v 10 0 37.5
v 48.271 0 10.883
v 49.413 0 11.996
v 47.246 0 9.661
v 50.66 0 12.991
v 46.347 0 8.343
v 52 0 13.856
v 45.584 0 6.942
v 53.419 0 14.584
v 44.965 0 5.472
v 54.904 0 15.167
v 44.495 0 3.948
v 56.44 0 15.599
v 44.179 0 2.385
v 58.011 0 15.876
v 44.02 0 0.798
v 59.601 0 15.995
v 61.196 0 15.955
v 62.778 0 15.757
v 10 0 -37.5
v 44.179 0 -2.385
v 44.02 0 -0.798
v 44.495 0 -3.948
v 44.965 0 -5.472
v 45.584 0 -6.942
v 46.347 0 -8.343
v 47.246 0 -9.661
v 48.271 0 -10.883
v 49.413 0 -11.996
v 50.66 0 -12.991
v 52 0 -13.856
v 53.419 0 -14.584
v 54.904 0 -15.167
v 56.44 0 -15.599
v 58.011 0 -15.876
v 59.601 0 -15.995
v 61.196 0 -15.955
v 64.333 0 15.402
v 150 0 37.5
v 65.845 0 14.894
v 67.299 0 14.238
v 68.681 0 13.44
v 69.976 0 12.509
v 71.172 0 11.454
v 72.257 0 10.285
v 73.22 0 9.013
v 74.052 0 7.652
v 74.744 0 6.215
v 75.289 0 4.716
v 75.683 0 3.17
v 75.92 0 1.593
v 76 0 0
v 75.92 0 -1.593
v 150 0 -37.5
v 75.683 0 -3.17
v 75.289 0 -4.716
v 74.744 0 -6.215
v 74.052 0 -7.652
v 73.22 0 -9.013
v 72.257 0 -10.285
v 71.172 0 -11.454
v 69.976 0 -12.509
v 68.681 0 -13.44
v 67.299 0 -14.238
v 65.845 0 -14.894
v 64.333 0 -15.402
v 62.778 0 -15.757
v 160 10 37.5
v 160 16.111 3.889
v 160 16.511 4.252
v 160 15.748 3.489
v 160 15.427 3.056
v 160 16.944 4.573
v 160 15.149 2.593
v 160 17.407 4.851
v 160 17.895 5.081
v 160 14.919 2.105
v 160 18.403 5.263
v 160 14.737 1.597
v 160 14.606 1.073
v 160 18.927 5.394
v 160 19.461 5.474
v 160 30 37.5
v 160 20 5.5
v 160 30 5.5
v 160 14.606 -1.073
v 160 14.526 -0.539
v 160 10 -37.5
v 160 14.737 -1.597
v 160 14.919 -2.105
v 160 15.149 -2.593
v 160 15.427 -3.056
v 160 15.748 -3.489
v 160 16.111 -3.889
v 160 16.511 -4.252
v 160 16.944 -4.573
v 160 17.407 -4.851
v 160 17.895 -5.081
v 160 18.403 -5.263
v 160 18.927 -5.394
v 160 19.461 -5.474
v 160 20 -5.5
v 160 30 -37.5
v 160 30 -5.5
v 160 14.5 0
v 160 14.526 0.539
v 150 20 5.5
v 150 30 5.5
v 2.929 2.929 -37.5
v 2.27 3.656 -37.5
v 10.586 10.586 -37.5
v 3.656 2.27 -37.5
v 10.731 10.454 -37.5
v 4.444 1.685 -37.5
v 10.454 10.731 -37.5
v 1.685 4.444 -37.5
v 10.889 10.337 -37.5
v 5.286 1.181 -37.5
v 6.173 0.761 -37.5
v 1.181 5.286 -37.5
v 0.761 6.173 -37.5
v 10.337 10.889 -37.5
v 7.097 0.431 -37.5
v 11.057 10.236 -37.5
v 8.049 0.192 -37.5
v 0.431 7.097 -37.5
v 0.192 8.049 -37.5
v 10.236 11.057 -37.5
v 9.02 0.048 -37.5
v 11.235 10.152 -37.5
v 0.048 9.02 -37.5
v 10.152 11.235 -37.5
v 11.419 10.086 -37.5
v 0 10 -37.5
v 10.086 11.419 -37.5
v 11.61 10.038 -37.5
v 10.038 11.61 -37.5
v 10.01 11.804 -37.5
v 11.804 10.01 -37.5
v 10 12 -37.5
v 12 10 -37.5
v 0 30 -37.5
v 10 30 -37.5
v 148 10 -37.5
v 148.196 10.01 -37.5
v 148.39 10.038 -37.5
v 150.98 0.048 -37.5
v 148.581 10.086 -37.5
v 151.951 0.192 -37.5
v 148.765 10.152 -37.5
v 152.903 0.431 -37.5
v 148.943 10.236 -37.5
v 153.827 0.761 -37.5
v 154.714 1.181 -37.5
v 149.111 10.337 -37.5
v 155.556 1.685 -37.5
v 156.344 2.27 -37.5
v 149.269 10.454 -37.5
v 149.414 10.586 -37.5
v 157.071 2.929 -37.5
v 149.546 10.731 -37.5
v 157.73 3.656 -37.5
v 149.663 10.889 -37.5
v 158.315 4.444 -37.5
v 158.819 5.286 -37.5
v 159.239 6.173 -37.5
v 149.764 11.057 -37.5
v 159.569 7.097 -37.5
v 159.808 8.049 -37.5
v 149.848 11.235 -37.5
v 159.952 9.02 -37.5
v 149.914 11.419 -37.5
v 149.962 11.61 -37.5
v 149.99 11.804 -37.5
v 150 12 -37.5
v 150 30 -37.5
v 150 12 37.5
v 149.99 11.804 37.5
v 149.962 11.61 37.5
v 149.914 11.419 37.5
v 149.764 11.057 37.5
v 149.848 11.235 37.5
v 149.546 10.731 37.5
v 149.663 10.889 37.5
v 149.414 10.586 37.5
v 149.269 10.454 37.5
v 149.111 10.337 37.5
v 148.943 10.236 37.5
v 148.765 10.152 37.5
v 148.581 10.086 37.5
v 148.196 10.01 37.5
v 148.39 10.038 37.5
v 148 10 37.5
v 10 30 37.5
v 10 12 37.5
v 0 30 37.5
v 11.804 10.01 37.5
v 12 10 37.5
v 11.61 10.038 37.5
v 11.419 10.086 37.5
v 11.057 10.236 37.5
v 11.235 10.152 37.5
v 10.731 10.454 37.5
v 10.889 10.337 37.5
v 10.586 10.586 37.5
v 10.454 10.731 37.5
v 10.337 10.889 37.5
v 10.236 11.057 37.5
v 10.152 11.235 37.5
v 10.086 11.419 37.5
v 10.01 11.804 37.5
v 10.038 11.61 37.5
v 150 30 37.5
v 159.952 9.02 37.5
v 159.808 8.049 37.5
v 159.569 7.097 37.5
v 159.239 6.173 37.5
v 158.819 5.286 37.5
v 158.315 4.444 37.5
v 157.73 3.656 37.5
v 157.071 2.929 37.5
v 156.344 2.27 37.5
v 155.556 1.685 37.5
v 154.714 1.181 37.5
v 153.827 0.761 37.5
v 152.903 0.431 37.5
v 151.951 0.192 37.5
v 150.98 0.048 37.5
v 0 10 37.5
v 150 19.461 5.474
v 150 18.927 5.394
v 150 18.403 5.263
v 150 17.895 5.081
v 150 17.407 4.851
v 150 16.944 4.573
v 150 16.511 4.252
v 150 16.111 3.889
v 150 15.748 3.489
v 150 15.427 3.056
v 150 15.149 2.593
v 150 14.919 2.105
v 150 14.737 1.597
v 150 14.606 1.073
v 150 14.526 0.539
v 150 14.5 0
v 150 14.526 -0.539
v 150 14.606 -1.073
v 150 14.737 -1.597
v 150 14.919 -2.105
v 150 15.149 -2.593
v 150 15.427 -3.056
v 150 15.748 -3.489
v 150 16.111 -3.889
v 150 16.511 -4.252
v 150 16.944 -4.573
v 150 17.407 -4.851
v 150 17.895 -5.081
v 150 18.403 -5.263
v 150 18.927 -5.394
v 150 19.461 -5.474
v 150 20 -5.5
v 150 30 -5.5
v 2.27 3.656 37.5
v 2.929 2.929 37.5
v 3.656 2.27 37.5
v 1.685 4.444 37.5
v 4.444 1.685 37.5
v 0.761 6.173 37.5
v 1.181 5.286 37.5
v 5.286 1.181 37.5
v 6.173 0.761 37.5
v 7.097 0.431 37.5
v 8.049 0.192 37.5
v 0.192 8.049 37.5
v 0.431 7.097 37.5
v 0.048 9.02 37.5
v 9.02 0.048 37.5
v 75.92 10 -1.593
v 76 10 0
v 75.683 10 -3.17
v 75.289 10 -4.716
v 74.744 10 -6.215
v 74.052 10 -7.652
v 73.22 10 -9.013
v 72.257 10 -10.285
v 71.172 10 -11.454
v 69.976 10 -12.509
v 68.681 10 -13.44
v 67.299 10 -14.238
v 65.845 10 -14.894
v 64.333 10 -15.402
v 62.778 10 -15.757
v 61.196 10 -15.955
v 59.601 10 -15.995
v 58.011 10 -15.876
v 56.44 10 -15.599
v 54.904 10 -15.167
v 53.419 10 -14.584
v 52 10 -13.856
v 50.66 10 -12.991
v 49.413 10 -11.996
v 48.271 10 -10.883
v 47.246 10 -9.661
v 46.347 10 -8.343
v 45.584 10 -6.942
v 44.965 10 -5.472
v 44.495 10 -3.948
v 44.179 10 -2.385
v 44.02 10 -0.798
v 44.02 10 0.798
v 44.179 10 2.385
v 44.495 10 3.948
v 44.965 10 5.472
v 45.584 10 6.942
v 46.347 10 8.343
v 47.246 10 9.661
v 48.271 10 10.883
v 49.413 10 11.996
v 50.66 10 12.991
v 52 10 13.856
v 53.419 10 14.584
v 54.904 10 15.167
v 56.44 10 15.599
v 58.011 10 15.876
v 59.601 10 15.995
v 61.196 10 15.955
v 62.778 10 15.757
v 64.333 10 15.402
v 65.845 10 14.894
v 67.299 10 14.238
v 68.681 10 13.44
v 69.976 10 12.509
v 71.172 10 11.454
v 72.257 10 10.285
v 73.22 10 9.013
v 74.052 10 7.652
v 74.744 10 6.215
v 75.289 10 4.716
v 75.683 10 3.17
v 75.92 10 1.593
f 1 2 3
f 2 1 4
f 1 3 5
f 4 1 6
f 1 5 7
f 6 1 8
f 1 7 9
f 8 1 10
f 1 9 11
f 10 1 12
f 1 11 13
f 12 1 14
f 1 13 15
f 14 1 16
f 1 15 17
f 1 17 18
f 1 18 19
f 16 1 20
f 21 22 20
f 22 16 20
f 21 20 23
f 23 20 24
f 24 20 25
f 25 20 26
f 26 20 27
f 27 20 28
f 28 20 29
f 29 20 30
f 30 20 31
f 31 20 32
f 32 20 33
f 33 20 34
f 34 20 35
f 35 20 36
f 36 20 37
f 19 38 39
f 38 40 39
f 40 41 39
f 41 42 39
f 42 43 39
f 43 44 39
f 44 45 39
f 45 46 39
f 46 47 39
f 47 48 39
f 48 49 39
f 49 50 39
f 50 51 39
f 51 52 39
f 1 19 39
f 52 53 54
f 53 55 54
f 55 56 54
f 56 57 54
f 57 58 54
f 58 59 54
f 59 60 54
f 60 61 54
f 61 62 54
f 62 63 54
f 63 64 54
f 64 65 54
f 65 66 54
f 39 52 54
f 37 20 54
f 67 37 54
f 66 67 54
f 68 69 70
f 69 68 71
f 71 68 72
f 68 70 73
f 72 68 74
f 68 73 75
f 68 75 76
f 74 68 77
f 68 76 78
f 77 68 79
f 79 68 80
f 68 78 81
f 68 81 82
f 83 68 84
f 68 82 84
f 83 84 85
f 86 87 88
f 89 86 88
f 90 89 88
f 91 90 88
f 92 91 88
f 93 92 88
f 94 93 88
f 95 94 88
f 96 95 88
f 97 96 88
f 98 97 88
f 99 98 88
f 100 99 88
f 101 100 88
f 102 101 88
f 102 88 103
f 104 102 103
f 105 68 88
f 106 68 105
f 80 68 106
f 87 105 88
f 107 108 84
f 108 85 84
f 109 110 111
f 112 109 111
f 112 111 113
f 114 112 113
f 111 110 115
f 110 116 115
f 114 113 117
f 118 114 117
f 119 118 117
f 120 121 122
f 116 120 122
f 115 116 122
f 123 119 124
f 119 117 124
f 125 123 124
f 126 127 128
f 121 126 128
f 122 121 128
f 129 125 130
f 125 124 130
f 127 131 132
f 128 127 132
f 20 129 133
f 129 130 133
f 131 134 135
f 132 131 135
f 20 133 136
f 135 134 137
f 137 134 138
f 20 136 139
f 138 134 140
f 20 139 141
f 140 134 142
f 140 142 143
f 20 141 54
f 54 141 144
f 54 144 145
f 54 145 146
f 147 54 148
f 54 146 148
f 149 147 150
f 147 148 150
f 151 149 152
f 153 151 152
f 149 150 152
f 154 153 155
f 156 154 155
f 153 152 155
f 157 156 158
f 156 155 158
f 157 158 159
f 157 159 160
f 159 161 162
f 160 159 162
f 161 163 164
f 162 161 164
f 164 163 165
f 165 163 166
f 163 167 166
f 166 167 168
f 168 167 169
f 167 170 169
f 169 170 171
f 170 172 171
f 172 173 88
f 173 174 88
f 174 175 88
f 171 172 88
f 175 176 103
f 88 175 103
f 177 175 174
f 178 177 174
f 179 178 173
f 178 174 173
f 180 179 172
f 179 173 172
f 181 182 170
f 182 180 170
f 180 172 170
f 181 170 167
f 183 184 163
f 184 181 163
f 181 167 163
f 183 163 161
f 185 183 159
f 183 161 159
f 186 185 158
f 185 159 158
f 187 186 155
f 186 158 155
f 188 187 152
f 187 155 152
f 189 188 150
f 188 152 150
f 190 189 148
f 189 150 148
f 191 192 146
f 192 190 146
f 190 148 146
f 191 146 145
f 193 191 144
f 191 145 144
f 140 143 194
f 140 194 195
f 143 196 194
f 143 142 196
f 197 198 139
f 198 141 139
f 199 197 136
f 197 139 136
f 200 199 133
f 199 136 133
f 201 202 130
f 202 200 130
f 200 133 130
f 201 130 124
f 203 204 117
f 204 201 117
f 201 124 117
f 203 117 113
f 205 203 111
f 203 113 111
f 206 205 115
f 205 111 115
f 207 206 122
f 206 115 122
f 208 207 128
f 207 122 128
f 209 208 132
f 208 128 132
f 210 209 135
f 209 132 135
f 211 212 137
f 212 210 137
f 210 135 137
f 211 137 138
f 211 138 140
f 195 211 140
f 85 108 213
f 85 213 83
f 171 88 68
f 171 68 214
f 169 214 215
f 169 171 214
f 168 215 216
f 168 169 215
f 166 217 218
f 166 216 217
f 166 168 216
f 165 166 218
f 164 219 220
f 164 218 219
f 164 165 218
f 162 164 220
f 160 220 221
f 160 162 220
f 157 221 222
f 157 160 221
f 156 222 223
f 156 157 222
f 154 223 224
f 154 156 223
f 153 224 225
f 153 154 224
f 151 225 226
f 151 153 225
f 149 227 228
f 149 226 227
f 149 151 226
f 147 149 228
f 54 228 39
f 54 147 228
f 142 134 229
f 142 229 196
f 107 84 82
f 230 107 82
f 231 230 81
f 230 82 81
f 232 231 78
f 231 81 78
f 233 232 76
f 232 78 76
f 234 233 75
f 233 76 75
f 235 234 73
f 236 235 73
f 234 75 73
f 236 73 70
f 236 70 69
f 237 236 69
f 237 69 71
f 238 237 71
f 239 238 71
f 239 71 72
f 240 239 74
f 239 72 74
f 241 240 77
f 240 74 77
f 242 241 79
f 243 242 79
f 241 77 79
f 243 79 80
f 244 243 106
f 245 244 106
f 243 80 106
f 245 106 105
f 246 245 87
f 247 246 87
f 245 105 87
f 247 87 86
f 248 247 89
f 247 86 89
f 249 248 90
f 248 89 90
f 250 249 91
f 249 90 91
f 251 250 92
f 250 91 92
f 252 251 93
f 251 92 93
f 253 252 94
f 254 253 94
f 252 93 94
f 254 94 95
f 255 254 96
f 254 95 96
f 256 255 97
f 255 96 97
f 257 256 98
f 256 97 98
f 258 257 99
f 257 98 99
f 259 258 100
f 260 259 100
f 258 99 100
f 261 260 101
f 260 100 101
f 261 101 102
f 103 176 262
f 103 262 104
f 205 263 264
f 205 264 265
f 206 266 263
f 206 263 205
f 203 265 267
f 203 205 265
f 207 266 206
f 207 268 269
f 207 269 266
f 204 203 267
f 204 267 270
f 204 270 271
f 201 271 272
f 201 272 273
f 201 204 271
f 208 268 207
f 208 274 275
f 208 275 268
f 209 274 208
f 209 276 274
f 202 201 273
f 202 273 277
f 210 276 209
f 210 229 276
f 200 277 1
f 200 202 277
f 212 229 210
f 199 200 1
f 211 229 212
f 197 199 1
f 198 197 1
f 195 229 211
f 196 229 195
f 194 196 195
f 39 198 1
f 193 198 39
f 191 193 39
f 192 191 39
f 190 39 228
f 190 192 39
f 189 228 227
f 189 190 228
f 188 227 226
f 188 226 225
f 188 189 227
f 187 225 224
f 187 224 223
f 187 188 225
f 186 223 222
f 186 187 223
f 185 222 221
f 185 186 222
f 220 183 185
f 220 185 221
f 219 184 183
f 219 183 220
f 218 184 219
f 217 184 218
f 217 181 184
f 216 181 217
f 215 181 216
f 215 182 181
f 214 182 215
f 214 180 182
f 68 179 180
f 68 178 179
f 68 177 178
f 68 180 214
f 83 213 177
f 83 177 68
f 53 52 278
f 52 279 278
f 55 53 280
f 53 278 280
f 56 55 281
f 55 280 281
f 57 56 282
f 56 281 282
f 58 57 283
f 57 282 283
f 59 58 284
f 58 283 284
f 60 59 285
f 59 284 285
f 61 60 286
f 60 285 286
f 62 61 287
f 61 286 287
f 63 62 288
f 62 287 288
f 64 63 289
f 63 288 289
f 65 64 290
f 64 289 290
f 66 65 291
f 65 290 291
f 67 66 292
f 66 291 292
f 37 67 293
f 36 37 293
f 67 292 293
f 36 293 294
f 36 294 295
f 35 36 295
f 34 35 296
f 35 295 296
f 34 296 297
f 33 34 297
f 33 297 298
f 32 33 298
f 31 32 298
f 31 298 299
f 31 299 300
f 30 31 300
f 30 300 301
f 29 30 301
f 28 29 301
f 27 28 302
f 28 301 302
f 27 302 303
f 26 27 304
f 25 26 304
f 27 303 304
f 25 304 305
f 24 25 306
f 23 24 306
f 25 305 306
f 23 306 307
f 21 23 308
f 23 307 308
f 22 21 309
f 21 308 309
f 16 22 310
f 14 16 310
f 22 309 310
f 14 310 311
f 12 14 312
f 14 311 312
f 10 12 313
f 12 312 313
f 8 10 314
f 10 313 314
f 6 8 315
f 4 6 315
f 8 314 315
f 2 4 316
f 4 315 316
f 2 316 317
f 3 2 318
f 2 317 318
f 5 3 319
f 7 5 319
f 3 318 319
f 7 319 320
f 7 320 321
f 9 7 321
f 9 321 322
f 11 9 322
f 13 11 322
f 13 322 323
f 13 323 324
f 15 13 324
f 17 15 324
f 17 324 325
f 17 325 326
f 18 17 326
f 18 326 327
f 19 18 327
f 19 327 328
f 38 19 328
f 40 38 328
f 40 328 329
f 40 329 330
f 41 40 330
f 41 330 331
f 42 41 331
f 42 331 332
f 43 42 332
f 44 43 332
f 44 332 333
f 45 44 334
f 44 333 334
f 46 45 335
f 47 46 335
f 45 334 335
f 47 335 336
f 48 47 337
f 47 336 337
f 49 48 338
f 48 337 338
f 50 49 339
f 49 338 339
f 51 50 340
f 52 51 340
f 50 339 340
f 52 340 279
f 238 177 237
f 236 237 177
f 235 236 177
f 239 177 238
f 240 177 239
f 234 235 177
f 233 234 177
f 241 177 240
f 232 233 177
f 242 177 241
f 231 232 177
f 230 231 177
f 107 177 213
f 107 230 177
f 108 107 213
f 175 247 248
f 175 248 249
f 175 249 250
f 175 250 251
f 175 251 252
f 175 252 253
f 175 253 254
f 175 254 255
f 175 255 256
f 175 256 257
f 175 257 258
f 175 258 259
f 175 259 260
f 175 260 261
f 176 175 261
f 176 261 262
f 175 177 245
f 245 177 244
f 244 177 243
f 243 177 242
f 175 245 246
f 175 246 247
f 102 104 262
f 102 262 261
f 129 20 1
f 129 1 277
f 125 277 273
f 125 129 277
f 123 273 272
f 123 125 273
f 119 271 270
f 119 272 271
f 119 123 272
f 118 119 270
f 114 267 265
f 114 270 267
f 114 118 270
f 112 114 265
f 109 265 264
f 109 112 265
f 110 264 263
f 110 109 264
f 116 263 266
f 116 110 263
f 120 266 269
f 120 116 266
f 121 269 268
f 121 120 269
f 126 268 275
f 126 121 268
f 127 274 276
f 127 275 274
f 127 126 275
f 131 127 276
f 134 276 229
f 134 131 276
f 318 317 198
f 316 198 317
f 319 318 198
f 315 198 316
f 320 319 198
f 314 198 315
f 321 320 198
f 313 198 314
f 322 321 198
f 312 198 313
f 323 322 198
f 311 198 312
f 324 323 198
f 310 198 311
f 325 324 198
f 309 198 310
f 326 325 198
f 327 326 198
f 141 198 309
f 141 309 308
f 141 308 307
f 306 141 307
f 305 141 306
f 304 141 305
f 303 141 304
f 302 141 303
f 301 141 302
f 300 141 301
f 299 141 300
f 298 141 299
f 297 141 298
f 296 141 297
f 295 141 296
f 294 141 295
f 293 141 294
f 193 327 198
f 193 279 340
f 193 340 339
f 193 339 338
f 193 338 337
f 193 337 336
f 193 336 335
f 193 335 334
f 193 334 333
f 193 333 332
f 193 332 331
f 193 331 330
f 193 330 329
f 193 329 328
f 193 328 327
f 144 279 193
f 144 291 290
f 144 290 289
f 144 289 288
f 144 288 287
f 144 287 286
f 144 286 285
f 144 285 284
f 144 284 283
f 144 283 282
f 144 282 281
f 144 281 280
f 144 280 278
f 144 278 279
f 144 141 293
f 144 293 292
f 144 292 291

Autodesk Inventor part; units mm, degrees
ref_plane "YZ Plane" through (0, 0, 0) normal (1, 0, 0) x (0, 1, 0)
ref_plane "XZ Plane" through (0, 0, 0) normal (0, 1, 0) x (-1, 0, 0)
ref_plane "XY Plane" through (0, 0, 0) normal (0, 0, 1) x (1, 0, 0)
sketch "Sketch1" plane through (0, 0, 0) normal (0, 0, 1) x (1, 0, 0)
  line L0 (10, 0) -> (150, 0)
  line L1 (160, 0) -> (160, 30)
  line L2 (0, 10) -> (0, 30)
  line L3 (0, 30) -> (10, 30)
  line L4 (10, 30) -> (10, 10)
  line L5 (12, 10) -> (150, 10)
  line L6 (150, 12) -> (150, 30)
  line L7 (150, 30) -> (160, 30)
  arc A0 (0, 10) -> (10, 0) centre (10, 10) ccw
  arc A1 (150, 0) -> (160, 10) centre (150, 10) ccw
  arc A2 (10, 12) -> (12, 10) centre (12, 12) ccw
  arc A3 (148, 10) -> (150, 12) centre (148, 12) ccw
  point P0 (0, 0)
  dimension "d0" = 160
  dimension "d1" = 30
  dimension "d2" = 30
  dimension "d3" = 10
  dimension "d4" = 20
  dimension "d5" = 140
  dimension "d8" = 20
  dimension "d9" = 20
  dimension "d10" = 4
  dimension "d11" = 4
extrude "Extrusion1" add sketch "Sketch1" along normal mid plane 75
sketch "Sketch2" plane through (160, 10, 37.5) normal (1, 0, 0) x (0, 0, -1)
  line L0 (37.5, -10) -> (0, -10)
  line L1 (0, -10) -> (75, -10) projected
  line L2 (32, 20) -> (32, 10)
  line L3 (43, 20) -> (43, 10)
  arc A0 (32, 10) -> (43, 10) centre (37.5, 10) ccw
  line L4 (32, 20) -> (43, 20)
  line L5 (75, 20) -> (0, 20) projected
  dimension "d16" = 11
extrude "Extrusion2" cut sketch "Sketch2" against normal blind 75
sketch "Sketch3" plane through (12, 10, 37.5) normal (0, 1, 0) x (1, 0, 0)
  line L0 (0, 0) -> (0, 75) projected
  circle A0 centre (48, 37.5) radius 16
  line L1 (-12, 0) -> (-12, 75) projected
  line L2 (-12, 0) -> (-12, 37.5)
  line L3 (-12, 37.5) -> (48, 37.5)
  dimension "d20" = 32
  dimension "d22" = 60
extrude "Extrusion3" cut sketch "Sketch3" against normal through all
equation "\"BendRadius\" = Thickness"
equation "\"BendReliefWidth\" = Thickness"
equation "\"BendReliefDepth\" = 0.5 * Thickness"
equation "\"CornerReliefSize\" = 4 * Thickness"
equation "\"MinimumRemnant\" = 2 * Thickness"
equation "\"TransitionRadius\" = BendRadius"
equation "\"JacobiRadiusSize\" = BendRadius"
equation "\"GapSize\" = Thickness"
equation "\"Thickness\" = 0.5"
properties part number "Base-Plate"
